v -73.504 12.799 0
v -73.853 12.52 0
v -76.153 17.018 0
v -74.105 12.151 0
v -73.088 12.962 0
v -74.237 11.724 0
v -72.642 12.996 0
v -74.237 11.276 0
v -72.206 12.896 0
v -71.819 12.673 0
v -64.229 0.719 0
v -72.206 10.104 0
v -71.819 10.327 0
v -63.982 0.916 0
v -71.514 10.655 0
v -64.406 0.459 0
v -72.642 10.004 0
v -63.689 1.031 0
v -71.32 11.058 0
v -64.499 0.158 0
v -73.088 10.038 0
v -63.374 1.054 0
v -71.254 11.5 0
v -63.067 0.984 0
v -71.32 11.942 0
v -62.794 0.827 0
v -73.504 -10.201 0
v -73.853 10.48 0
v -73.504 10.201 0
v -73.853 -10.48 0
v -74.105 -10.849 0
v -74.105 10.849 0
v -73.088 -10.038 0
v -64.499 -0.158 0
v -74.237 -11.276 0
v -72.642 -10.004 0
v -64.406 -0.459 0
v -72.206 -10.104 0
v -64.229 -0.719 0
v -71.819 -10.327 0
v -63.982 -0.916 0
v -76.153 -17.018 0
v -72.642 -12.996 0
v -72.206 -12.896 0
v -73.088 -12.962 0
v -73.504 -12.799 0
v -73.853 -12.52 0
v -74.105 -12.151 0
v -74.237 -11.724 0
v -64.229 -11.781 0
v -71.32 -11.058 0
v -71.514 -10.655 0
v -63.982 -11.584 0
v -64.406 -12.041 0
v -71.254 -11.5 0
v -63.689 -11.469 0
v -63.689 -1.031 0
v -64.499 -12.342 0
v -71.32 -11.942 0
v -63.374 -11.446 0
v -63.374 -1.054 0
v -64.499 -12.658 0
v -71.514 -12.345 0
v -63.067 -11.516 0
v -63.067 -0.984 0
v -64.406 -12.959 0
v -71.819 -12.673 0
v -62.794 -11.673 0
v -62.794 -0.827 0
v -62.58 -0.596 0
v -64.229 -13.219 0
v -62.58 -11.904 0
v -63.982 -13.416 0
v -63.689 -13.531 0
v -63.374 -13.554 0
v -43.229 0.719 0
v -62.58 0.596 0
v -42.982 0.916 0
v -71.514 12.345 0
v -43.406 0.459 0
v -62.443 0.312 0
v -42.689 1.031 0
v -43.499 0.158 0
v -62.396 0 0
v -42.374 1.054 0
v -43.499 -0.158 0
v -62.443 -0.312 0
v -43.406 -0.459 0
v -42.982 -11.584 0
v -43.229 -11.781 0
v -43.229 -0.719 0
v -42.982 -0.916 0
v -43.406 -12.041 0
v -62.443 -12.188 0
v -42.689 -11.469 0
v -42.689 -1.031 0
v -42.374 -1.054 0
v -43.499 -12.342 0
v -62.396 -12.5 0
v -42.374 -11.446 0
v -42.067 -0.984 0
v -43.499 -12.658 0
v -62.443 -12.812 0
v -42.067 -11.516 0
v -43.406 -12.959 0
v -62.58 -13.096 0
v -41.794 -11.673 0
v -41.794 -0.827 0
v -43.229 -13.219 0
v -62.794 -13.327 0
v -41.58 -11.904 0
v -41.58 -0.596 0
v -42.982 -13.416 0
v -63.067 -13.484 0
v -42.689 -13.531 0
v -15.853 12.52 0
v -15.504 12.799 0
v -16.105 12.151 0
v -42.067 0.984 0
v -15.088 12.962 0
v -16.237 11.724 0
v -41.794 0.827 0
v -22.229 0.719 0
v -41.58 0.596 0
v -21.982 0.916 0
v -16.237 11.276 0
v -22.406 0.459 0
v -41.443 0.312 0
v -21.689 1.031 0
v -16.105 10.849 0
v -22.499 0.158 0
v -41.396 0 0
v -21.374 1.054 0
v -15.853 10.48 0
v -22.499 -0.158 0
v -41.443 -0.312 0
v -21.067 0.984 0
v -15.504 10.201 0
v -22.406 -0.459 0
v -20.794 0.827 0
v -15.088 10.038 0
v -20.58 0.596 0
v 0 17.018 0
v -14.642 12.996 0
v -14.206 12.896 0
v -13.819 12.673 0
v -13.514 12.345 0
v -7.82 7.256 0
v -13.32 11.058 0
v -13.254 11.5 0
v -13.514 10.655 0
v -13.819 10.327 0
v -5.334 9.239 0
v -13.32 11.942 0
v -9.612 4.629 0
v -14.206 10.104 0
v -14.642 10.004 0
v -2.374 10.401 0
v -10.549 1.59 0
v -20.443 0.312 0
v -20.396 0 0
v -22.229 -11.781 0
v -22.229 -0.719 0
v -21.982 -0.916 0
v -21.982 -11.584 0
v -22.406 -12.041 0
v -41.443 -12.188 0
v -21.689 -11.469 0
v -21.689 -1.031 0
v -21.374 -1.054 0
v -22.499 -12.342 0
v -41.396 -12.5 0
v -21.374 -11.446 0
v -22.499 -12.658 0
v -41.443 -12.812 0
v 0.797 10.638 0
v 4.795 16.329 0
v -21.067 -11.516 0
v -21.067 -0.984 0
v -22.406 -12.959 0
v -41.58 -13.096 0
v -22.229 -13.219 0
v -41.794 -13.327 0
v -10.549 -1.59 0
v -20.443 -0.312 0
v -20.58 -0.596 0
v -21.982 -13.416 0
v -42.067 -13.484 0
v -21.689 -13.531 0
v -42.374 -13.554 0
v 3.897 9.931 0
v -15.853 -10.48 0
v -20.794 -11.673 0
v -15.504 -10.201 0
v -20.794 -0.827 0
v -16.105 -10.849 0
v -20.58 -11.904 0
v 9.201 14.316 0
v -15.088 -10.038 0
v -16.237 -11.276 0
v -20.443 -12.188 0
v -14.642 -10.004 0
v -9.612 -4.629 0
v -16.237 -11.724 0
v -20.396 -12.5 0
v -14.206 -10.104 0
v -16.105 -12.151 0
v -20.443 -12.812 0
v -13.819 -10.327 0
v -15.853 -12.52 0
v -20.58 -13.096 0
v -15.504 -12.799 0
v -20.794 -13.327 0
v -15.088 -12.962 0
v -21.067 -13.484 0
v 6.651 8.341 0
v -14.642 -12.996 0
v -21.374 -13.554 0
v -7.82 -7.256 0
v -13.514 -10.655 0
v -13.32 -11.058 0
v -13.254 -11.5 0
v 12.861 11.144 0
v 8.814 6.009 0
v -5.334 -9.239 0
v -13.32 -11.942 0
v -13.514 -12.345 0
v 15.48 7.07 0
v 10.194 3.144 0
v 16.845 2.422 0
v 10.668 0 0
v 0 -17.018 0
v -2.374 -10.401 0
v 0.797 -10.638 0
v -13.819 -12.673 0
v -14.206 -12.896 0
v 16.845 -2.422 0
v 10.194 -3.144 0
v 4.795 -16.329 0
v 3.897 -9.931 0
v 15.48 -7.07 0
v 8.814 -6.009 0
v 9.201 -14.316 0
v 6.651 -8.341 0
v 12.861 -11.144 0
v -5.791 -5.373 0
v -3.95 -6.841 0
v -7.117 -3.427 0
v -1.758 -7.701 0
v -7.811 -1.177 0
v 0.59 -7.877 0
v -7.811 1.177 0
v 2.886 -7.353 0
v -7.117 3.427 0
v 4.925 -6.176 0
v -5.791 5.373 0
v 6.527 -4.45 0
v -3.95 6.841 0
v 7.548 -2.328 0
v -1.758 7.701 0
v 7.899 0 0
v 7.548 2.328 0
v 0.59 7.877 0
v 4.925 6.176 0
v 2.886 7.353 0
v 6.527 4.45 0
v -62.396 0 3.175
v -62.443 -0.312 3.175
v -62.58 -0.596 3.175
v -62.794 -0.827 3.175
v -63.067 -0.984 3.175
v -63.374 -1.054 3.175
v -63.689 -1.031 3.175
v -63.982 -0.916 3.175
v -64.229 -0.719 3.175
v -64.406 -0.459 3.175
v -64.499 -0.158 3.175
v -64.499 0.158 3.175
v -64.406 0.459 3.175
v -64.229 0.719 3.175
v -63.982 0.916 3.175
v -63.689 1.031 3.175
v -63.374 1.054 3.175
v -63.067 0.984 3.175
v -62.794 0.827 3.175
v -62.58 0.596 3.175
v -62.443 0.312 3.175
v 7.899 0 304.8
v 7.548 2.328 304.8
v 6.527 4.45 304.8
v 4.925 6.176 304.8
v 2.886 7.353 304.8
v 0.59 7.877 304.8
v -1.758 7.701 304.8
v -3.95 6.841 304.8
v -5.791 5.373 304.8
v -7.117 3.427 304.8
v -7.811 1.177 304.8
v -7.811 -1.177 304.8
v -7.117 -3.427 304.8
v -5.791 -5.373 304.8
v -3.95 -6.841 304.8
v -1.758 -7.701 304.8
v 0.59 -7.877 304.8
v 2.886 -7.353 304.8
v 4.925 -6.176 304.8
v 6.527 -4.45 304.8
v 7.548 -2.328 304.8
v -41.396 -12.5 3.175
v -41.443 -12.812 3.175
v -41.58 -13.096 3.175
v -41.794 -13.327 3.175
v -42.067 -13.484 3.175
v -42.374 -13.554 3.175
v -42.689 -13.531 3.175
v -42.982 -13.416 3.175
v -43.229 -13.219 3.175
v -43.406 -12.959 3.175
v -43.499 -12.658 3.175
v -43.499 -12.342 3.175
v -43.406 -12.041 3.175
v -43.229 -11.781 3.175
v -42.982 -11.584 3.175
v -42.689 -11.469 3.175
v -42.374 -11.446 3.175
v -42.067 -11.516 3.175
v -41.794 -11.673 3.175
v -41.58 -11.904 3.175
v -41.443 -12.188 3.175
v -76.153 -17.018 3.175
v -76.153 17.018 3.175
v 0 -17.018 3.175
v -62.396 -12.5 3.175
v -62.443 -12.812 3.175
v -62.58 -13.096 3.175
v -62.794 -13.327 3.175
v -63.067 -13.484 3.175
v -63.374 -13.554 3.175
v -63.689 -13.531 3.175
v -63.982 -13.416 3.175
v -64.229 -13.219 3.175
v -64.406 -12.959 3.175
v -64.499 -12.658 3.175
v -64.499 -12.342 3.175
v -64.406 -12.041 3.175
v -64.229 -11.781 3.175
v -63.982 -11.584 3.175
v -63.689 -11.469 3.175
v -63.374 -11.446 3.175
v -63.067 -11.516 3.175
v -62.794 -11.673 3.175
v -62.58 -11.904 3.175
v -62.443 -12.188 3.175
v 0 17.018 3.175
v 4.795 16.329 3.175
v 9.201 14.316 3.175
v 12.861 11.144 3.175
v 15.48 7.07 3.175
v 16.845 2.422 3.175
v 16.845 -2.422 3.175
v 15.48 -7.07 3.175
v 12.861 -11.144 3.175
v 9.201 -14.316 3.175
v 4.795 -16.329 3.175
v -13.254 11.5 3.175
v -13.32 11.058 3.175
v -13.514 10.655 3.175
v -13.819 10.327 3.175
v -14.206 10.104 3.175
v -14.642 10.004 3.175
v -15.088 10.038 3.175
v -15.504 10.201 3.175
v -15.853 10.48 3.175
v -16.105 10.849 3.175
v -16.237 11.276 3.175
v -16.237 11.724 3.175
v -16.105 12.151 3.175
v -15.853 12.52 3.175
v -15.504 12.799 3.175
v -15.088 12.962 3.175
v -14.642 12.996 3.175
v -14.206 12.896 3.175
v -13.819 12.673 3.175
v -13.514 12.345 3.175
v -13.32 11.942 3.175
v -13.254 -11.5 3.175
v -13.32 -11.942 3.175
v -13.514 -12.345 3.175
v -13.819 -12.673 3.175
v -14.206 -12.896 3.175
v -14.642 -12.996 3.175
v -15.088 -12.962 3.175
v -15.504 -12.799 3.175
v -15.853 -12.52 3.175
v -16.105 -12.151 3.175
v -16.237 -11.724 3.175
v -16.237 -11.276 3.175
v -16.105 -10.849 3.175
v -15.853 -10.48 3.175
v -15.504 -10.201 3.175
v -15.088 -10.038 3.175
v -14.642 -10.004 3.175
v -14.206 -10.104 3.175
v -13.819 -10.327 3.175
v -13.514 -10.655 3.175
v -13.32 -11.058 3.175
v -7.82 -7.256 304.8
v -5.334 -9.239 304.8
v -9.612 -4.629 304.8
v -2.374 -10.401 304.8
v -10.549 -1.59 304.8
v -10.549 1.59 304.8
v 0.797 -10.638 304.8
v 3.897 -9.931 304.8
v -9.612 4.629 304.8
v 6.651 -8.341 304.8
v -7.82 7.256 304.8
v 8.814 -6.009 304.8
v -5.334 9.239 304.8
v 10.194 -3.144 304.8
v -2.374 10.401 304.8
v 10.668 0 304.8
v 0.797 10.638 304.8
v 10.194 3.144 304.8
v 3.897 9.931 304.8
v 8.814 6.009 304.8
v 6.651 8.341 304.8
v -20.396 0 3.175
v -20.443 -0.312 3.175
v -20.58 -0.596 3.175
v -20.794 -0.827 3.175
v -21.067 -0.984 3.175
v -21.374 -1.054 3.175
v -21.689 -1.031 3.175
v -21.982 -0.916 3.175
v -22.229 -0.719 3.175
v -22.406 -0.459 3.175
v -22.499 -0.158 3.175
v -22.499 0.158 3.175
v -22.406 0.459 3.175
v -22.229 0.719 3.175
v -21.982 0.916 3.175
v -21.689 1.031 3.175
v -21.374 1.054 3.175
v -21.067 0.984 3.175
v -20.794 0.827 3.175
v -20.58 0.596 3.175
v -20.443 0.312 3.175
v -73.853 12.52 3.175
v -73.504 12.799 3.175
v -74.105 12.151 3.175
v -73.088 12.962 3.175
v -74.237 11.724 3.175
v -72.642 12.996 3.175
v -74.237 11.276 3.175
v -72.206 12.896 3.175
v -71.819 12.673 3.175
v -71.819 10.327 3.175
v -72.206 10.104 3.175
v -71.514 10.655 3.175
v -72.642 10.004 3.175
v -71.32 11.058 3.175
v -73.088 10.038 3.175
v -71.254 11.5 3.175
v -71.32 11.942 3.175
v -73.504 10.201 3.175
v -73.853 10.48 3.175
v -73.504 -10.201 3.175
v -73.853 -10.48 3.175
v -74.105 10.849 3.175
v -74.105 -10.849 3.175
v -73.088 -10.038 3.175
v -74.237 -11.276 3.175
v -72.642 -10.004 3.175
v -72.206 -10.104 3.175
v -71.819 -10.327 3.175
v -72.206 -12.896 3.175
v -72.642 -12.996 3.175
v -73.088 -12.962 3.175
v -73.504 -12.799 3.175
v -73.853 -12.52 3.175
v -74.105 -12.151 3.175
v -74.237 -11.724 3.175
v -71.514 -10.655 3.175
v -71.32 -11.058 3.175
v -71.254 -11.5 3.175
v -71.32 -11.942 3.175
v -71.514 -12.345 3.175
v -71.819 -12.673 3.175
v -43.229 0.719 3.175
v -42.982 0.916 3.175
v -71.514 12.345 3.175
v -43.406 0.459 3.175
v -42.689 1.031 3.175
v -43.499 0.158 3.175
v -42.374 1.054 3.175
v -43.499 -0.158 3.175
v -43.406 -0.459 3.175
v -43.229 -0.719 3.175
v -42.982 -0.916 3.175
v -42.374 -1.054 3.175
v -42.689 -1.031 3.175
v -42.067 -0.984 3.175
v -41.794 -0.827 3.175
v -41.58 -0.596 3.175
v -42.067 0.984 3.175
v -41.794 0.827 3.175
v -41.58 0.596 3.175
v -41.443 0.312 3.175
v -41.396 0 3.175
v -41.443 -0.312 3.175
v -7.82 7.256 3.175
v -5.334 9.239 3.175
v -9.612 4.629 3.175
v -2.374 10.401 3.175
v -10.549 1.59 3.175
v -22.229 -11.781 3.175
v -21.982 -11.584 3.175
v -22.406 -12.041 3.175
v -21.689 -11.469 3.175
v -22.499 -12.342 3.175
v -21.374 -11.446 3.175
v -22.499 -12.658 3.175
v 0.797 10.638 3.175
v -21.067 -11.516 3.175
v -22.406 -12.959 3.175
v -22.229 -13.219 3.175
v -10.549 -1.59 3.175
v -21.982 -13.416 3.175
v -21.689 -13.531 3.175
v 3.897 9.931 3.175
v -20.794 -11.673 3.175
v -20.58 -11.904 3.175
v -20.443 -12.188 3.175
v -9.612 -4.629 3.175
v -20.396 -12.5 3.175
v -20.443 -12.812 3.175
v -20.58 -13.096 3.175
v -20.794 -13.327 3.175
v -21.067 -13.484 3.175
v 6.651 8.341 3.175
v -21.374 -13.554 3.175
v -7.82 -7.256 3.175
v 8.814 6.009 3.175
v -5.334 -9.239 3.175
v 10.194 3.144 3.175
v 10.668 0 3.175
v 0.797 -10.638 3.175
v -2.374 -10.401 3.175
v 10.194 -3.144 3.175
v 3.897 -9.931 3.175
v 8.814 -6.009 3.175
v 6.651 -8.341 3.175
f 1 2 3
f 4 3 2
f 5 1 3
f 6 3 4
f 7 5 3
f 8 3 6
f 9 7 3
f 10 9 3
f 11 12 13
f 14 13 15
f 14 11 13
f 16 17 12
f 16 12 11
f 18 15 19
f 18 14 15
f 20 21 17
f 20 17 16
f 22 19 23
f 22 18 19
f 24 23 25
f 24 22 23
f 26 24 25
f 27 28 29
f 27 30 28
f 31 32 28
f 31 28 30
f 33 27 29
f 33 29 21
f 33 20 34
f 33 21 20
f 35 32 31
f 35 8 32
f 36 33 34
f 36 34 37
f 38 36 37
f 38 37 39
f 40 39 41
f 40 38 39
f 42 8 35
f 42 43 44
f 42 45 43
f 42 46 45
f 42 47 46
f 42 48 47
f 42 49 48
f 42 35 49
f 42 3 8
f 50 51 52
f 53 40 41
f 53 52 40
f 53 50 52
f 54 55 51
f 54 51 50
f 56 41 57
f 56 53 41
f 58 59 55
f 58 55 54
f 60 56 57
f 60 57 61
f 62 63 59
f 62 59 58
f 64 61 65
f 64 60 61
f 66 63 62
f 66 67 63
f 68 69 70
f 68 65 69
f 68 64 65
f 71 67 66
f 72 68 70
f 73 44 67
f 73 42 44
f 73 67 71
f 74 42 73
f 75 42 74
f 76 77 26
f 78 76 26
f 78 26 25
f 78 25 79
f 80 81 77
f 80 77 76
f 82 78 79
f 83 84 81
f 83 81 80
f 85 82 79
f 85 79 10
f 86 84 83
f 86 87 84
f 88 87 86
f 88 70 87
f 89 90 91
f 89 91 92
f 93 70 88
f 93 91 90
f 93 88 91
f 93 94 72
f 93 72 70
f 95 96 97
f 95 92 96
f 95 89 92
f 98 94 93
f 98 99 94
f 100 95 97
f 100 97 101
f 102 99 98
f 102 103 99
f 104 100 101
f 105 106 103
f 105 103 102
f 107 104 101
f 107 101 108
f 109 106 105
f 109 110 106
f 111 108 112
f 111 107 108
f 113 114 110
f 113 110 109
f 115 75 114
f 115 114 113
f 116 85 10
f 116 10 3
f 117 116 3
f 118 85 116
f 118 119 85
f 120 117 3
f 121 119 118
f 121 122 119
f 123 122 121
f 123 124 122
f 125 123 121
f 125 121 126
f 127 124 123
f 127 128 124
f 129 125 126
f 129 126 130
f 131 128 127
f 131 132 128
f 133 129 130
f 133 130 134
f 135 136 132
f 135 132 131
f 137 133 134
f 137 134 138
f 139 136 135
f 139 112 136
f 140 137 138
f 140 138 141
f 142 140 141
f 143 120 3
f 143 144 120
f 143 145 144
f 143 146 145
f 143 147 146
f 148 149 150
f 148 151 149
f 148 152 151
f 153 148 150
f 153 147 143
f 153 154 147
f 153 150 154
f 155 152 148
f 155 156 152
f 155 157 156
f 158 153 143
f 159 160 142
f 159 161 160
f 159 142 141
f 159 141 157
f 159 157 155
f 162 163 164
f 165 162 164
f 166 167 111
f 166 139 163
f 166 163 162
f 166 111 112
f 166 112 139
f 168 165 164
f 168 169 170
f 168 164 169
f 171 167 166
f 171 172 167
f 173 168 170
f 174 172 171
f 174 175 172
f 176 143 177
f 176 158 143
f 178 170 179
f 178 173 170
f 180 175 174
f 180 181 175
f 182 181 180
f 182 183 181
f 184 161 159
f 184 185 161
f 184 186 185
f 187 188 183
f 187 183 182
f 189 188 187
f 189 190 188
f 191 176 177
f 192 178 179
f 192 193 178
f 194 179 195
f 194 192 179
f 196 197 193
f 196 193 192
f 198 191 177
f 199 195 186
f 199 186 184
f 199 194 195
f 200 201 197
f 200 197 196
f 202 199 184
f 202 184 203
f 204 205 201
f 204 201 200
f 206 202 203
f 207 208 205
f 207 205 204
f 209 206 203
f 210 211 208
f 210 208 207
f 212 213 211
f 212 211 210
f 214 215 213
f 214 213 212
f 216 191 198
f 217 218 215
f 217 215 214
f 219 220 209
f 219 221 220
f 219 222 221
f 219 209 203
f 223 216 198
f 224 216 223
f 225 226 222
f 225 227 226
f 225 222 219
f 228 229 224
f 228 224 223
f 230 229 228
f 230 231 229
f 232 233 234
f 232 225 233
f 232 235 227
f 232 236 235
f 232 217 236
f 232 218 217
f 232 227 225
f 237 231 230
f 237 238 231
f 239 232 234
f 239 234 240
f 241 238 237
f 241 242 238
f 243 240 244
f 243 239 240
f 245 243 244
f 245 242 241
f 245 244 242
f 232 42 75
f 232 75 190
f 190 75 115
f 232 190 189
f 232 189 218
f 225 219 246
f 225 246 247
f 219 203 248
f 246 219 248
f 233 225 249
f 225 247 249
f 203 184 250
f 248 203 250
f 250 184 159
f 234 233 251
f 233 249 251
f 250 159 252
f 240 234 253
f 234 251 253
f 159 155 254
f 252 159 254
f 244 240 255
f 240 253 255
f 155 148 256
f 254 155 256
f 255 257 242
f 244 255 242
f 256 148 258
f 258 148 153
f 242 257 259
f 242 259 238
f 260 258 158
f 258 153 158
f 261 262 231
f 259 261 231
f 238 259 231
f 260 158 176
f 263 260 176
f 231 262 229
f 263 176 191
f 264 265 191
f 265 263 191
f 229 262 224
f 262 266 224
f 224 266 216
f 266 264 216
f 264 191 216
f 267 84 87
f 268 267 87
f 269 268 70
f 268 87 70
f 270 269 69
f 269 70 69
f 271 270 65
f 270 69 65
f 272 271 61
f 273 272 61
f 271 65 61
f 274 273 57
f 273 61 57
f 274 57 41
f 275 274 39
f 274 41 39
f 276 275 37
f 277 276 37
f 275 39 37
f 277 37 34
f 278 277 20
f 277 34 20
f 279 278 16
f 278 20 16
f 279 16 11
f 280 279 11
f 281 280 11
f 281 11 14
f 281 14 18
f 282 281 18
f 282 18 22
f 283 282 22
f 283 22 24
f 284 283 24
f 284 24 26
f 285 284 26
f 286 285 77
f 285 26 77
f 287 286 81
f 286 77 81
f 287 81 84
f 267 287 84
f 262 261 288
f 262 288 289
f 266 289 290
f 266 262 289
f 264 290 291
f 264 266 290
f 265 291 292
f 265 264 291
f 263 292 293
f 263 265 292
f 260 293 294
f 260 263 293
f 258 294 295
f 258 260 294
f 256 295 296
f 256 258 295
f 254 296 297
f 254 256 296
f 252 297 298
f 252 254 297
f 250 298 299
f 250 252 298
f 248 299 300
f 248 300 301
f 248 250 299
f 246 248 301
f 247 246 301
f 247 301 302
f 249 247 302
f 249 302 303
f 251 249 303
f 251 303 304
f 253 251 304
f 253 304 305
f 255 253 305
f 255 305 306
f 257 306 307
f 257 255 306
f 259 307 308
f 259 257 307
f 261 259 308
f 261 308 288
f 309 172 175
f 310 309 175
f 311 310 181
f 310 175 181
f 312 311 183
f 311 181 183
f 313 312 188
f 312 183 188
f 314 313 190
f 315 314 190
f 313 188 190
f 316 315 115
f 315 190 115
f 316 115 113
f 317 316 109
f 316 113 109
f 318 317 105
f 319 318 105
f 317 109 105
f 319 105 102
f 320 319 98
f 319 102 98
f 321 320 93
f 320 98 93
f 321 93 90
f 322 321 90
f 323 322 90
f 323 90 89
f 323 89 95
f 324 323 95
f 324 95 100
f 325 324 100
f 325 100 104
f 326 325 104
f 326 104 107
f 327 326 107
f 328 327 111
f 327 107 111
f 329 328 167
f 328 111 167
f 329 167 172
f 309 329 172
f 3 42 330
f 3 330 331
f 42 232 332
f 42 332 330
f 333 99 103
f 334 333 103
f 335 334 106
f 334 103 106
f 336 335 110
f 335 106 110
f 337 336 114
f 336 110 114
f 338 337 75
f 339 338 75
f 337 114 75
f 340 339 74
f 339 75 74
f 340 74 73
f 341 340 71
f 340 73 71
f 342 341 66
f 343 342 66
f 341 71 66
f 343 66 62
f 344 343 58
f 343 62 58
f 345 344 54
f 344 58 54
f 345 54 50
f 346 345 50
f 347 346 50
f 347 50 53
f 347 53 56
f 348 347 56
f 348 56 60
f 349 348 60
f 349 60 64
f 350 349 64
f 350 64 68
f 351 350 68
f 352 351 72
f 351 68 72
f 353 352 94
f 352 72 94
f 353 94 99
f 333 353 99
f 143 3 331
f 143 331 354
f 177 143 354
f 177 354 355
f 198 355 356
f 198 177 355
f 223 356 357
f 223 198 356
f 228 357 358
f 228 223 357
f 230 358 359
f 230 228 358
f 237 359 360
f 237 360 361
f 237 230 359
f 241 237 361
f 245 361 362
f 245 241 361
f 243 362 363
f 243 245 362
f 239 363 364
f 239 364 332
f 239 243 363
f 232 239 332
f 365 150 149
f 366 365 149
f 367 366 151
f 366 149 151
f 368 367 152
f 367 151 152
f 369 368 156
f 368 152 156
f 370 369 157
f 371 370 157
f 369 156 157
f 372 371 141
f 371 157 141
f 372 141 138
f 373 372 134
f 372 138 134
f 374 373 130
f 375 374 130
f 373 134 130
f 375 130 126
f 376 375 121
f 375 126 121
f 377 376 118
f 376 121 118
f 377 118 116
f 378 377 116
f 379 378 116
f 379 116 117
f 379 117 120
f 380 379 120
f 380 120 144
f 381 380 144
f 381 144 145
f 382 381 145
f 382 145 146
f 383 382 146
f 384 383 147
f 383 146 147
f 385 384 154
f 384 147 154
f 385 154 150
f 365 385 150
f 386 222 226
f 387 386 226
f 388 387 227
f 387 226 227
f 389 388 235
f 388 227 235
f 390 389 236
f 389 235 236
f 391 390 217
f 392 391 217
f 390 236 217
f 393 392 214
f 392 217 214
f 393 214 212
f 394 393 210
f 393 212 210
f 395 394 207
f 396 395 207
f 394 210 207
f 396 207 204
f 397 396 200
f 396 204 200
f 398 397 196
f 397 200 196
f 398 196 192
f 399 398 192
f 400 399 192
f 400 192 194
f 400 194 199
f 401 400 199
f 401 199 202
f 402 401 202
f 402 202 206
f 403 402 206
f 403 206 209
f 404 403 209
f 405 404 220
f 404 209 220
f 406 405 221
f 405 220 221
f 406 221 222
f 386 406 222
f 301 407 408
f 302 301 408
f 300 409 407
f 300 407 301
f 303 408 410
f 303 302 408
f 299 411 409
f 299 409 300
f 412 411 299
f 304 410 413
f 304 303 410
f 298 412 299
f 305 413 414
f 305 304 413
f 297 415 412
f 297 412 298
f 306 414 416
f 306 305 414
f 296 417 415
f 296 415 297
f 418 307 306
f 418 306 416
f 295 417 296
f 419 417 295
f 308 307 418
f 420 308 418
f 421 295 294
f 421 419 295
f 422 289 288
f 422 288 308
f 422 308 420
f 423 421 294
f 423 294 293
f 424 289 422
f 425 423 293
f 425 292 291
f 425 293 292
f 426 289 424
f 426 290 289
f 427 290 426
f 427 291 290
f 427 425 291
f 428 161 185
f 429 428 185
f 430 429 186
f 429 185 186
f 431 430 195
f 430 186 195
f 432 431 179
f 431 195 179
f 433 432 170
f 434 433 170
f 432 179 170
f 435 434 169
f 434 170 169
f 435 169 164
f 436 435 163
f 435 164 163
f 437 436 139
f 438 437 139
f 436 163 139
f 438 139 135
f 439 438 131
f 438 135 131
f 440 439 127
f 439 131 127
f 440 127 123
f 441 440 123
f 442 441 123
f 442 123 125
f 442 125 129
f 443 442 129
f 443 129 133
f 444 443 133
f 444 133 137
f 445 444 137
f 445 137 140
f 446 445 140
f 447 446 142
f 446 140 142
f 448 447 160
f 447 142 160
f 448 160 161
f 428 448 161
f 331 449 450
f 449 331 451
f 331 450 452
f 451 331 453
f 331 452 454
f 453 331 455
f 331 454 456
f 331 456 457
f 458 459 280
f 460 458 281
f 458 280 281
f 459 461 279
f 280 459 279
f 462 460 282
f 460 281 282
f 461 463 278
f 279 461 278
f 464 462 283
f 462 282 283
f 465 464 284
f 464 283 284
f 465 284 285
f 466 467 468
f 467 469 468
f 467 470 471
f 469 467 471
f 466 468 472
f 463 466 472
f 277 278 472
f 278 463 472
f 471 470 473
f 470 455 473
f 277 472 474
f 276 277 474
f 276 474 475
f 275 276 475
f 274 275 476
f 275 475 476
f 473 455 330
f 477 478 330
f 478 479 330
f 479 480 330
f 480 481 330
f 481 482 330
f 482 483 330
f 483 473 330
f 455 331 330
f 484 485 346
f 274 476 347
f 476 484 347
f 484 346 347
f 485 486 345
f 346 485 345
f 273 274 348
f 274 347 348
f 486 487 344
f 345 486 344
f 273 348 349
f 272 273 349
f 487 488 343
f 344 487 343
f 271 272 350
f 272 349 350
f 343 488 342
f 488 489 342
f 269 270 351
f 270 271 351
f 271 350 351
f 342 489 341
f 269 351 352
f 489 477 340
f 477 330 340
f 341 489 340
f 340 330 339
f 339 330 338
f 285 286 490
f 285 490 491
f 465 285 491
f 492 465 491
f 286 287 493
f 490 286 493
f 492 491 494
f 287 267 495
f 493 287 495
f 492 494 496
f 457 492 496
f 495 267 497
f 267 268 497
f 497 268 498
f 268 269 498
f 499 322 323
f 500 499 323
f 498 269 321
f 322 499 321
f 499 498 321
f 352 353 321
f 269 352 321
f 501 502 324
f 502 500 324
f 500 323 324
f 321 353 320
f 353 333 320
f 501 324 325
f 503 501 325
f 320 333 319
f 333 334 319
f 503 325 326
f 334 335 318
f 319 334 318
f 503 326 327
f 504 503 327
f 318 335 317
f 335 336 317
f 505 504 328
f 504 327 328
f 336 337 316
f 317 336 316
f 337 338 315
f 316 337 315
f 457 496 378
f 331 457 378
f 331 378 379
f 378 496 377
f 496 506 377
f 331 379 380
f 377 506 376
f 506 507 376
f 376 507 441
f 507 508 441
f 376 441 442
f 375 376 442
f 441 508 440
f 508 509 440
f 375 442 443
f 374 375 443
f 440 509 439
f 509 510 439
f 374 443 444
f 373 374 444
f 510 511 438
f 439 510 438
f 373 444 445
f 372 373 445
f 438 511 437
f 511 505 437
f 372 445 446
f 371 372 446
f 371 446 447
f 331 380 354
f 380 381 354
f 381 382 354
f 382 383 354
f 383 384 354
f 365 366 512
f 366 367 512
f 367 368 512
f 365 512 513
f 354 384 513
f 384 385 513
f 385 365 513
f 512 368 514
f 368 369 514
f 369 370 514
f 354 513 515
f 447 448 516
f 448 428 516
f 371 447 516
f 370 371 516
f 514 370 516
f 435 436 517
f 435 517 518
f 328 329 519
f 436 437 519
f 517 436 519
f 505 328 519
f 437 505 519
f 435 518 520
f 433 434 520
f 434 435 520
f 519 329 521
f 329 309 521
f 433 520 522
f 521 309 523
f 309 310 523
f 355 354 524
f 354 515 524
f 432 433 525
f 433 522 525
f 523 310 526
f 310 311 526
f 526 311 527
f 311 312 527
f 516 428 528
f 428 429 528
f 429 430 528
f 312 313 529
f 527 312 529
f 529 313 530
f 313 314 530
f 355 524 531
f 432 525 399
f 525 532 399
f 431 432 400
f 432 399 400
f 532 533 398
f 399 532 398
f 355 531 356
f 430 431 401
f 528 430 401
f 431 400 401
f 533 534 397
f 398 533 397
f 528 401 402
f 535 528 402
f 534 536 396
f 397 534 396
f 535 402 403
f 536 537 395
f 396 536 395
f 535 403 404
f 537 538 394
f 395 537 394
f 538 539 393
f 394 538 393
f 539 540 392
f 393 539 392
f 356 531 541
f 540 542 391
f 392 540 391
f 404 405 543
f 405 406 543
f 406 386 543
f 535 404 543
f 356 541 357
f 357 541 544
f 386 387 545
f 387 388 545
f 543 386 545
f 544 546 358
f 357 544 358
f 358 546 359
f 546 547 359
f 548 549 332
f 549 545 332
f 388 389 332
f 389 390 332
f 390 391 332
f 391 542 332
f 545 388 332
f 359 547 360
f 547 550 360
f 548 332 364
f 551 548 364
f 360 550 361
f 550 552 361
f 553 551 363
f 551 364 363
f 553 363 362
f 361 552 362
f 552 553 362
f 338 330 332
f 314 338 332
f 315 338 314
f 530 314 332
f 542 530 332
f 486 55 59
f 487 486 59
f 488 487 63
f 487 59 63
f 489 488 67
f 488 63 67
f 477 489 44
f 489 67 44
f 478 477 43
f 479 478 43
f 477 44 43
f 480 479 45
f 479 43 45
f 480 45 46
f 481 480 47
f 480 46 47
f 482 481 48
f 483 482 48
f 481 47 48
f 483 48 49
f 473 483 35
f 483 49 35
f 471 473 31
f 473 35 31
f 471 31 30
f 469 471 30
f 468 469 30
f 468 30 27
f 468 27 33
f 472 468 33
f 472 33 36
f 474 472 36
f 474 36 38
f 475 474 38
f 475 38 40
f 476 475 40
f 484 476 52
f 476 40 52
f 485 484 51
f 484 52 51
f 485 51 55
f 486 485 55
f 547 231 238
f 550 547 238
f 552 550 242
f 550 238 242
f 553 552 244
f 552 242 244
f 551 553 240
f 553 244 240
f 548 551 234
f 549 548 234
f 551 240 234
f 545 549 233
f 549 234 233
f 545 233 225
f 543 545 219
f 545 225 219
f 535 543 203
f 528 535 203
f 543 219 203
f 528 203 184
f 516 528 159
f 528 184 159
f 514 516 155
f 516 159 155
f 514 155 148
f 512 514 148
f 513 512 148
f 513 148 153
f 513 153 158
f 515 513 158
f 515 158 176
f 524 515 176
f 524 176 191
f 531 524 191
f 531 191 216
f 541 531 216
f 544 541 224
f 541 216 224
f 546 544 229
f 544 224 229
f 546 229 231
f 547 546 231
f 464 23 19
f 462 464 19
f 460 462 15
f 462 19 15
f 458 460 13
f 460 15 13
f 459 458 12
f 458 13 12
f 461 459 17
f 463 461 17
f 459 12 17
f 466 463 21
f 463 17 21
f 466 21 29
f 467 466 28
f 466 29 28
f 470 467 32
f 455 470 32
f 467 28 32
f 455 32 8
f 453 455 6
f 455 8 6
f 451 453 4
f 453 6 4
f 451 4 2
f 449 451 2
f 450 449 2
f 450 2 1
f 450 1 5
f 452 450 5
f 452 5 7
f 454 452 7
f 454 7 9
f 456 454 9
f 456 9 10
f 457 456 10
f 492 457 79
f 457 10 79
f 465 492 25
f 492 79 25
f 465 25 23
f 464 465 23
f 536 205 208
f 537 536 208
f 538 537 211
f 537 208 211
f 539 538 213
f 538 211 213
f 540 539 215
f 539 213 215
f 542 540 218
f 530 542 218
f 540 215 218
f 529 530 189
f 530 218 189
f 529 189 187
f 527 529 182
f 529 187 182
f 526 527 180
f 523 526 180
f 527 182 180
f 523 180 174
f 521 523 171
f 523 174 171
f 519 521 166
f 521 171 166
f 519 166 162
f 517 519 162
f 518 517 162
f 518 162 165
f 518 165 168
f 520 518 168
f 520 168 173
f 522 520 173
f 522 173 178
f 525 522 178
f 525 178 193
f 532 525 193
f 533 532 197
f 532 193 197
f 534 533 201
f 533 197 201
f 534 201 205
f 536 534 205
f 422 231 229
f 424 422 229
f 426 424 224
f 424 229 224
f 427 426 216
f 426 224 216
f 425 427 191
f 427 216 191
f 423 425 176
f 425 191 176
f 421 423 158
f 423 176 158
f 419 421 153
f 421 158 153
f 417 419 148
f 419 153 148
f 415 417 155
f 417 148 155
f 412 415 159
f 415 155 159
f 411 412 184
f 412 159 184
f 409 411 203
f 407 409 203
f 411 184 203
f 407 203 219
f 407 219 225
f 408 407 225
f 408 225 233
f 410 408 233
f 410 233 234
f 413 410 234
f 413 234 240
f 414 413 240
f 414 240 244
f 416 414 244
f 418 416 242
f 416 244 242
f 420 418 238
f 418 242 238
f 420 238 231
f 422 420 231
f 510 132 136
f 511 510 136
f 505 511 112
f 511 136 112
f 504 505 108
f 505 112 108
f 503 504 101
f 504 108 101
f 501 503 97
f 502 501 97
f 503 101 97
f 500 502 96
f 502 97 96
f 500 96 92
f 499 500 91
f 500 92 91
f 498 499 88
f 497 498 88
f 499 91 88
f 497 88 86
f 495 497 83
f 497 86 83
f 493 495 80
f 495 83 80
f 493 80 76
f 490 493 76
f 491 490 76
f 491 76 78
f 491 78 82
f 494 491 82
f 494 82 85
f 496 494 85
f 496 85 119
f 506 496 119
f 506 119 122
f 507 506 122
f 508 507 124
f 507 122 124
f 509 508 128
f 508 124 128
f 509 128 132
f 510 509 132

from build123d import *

# Parameters (mm, degrees)
F0_R     = 10.668
F0_R_2   = 7.8994
F1_DEPTH = 304.8
F2_R     = 10.668
F3_DEPTH = 3.175
F4_R     = 1.057375
F5_DEPTH = 3.175
F6_R     = 1.5
F7_DEPTH = 3.175


with BuildPart() as f1:
    # F0 (on Top) → F1 (new body)
    with BuildSketch(Plane.XY):
        Circle(F0_R)
        Circle(F0_R_2, mode=Mode.SUBTRACT)
    extrude(amount=F1_DEPTH)


with BuildPart() as f3:
    # F2 (on face) → F3 (new body)
    with BuildSketch(Plane(origin=(0, 0, 0), x_dir=(1, 0, 0), z_dir=(0, 0, -1))):
        with BuildLine():
            Line((-76.153427, -17.018), (0, -17.018))
            ThreePointArc((0, -17.018), (17.018, 0), (0, 17.018))
            Line((0, 17.018), (-76.153427, 17.018))
            Line((-76.153427, 17.018), (-76.153427, -17.018))
        make_face()
        Circle(F2_R, mode=Mode.SUBTRACT)
    extrude(amount=-F3_DEPTH)

    # F4 (on face) → F5 (cut, through all)
    with BuildSketch(Plane(origin=(0, 0, 0), x_dir=(1, 0, 0), z_dir=(0, 0, -1))):
        with Locations((-63.453427, 0)):
            Circle(F4_R)
        with Locations((-63.453427, 12.5)):
            Circle(F4_R)
        with Locations((-42.453427, 0)):
            Circle(F4_R)
        with Locations((-42.453427, 12.5)):
            Circle(F4_R)
        with Locations((-21.453427, 0)):
            Circle(F4_R)
        with Locations((-21.453427, 12.5)):
            Circle(F4_R)
    extrude(amount=-F5_DEPTH, mode=Mode.SUBTRACT)

    # F6 (on face) → F7 (cut, through all)
    with BuildSketch(Plane(origin=(0, 0, 0), x_dir=(1, 0, 0), z_dir=(0, 0, -1))):
        with Locations((-72.753735, 11.5)):
            Circle(F6_R)
        with Locations((-72.753735, -11.5)):
            Circle(F6_R)
        with Locations((-14.753735, 11.5)):
            Circle(F6_R)
        with Locations((-14.753735, -11.5)):
            Circle(F6_R)
    extrude(amount=-F7_DEPTH, mode=Mode.SUBTRACT)


solid = Compound([f1.part, f3.part])
